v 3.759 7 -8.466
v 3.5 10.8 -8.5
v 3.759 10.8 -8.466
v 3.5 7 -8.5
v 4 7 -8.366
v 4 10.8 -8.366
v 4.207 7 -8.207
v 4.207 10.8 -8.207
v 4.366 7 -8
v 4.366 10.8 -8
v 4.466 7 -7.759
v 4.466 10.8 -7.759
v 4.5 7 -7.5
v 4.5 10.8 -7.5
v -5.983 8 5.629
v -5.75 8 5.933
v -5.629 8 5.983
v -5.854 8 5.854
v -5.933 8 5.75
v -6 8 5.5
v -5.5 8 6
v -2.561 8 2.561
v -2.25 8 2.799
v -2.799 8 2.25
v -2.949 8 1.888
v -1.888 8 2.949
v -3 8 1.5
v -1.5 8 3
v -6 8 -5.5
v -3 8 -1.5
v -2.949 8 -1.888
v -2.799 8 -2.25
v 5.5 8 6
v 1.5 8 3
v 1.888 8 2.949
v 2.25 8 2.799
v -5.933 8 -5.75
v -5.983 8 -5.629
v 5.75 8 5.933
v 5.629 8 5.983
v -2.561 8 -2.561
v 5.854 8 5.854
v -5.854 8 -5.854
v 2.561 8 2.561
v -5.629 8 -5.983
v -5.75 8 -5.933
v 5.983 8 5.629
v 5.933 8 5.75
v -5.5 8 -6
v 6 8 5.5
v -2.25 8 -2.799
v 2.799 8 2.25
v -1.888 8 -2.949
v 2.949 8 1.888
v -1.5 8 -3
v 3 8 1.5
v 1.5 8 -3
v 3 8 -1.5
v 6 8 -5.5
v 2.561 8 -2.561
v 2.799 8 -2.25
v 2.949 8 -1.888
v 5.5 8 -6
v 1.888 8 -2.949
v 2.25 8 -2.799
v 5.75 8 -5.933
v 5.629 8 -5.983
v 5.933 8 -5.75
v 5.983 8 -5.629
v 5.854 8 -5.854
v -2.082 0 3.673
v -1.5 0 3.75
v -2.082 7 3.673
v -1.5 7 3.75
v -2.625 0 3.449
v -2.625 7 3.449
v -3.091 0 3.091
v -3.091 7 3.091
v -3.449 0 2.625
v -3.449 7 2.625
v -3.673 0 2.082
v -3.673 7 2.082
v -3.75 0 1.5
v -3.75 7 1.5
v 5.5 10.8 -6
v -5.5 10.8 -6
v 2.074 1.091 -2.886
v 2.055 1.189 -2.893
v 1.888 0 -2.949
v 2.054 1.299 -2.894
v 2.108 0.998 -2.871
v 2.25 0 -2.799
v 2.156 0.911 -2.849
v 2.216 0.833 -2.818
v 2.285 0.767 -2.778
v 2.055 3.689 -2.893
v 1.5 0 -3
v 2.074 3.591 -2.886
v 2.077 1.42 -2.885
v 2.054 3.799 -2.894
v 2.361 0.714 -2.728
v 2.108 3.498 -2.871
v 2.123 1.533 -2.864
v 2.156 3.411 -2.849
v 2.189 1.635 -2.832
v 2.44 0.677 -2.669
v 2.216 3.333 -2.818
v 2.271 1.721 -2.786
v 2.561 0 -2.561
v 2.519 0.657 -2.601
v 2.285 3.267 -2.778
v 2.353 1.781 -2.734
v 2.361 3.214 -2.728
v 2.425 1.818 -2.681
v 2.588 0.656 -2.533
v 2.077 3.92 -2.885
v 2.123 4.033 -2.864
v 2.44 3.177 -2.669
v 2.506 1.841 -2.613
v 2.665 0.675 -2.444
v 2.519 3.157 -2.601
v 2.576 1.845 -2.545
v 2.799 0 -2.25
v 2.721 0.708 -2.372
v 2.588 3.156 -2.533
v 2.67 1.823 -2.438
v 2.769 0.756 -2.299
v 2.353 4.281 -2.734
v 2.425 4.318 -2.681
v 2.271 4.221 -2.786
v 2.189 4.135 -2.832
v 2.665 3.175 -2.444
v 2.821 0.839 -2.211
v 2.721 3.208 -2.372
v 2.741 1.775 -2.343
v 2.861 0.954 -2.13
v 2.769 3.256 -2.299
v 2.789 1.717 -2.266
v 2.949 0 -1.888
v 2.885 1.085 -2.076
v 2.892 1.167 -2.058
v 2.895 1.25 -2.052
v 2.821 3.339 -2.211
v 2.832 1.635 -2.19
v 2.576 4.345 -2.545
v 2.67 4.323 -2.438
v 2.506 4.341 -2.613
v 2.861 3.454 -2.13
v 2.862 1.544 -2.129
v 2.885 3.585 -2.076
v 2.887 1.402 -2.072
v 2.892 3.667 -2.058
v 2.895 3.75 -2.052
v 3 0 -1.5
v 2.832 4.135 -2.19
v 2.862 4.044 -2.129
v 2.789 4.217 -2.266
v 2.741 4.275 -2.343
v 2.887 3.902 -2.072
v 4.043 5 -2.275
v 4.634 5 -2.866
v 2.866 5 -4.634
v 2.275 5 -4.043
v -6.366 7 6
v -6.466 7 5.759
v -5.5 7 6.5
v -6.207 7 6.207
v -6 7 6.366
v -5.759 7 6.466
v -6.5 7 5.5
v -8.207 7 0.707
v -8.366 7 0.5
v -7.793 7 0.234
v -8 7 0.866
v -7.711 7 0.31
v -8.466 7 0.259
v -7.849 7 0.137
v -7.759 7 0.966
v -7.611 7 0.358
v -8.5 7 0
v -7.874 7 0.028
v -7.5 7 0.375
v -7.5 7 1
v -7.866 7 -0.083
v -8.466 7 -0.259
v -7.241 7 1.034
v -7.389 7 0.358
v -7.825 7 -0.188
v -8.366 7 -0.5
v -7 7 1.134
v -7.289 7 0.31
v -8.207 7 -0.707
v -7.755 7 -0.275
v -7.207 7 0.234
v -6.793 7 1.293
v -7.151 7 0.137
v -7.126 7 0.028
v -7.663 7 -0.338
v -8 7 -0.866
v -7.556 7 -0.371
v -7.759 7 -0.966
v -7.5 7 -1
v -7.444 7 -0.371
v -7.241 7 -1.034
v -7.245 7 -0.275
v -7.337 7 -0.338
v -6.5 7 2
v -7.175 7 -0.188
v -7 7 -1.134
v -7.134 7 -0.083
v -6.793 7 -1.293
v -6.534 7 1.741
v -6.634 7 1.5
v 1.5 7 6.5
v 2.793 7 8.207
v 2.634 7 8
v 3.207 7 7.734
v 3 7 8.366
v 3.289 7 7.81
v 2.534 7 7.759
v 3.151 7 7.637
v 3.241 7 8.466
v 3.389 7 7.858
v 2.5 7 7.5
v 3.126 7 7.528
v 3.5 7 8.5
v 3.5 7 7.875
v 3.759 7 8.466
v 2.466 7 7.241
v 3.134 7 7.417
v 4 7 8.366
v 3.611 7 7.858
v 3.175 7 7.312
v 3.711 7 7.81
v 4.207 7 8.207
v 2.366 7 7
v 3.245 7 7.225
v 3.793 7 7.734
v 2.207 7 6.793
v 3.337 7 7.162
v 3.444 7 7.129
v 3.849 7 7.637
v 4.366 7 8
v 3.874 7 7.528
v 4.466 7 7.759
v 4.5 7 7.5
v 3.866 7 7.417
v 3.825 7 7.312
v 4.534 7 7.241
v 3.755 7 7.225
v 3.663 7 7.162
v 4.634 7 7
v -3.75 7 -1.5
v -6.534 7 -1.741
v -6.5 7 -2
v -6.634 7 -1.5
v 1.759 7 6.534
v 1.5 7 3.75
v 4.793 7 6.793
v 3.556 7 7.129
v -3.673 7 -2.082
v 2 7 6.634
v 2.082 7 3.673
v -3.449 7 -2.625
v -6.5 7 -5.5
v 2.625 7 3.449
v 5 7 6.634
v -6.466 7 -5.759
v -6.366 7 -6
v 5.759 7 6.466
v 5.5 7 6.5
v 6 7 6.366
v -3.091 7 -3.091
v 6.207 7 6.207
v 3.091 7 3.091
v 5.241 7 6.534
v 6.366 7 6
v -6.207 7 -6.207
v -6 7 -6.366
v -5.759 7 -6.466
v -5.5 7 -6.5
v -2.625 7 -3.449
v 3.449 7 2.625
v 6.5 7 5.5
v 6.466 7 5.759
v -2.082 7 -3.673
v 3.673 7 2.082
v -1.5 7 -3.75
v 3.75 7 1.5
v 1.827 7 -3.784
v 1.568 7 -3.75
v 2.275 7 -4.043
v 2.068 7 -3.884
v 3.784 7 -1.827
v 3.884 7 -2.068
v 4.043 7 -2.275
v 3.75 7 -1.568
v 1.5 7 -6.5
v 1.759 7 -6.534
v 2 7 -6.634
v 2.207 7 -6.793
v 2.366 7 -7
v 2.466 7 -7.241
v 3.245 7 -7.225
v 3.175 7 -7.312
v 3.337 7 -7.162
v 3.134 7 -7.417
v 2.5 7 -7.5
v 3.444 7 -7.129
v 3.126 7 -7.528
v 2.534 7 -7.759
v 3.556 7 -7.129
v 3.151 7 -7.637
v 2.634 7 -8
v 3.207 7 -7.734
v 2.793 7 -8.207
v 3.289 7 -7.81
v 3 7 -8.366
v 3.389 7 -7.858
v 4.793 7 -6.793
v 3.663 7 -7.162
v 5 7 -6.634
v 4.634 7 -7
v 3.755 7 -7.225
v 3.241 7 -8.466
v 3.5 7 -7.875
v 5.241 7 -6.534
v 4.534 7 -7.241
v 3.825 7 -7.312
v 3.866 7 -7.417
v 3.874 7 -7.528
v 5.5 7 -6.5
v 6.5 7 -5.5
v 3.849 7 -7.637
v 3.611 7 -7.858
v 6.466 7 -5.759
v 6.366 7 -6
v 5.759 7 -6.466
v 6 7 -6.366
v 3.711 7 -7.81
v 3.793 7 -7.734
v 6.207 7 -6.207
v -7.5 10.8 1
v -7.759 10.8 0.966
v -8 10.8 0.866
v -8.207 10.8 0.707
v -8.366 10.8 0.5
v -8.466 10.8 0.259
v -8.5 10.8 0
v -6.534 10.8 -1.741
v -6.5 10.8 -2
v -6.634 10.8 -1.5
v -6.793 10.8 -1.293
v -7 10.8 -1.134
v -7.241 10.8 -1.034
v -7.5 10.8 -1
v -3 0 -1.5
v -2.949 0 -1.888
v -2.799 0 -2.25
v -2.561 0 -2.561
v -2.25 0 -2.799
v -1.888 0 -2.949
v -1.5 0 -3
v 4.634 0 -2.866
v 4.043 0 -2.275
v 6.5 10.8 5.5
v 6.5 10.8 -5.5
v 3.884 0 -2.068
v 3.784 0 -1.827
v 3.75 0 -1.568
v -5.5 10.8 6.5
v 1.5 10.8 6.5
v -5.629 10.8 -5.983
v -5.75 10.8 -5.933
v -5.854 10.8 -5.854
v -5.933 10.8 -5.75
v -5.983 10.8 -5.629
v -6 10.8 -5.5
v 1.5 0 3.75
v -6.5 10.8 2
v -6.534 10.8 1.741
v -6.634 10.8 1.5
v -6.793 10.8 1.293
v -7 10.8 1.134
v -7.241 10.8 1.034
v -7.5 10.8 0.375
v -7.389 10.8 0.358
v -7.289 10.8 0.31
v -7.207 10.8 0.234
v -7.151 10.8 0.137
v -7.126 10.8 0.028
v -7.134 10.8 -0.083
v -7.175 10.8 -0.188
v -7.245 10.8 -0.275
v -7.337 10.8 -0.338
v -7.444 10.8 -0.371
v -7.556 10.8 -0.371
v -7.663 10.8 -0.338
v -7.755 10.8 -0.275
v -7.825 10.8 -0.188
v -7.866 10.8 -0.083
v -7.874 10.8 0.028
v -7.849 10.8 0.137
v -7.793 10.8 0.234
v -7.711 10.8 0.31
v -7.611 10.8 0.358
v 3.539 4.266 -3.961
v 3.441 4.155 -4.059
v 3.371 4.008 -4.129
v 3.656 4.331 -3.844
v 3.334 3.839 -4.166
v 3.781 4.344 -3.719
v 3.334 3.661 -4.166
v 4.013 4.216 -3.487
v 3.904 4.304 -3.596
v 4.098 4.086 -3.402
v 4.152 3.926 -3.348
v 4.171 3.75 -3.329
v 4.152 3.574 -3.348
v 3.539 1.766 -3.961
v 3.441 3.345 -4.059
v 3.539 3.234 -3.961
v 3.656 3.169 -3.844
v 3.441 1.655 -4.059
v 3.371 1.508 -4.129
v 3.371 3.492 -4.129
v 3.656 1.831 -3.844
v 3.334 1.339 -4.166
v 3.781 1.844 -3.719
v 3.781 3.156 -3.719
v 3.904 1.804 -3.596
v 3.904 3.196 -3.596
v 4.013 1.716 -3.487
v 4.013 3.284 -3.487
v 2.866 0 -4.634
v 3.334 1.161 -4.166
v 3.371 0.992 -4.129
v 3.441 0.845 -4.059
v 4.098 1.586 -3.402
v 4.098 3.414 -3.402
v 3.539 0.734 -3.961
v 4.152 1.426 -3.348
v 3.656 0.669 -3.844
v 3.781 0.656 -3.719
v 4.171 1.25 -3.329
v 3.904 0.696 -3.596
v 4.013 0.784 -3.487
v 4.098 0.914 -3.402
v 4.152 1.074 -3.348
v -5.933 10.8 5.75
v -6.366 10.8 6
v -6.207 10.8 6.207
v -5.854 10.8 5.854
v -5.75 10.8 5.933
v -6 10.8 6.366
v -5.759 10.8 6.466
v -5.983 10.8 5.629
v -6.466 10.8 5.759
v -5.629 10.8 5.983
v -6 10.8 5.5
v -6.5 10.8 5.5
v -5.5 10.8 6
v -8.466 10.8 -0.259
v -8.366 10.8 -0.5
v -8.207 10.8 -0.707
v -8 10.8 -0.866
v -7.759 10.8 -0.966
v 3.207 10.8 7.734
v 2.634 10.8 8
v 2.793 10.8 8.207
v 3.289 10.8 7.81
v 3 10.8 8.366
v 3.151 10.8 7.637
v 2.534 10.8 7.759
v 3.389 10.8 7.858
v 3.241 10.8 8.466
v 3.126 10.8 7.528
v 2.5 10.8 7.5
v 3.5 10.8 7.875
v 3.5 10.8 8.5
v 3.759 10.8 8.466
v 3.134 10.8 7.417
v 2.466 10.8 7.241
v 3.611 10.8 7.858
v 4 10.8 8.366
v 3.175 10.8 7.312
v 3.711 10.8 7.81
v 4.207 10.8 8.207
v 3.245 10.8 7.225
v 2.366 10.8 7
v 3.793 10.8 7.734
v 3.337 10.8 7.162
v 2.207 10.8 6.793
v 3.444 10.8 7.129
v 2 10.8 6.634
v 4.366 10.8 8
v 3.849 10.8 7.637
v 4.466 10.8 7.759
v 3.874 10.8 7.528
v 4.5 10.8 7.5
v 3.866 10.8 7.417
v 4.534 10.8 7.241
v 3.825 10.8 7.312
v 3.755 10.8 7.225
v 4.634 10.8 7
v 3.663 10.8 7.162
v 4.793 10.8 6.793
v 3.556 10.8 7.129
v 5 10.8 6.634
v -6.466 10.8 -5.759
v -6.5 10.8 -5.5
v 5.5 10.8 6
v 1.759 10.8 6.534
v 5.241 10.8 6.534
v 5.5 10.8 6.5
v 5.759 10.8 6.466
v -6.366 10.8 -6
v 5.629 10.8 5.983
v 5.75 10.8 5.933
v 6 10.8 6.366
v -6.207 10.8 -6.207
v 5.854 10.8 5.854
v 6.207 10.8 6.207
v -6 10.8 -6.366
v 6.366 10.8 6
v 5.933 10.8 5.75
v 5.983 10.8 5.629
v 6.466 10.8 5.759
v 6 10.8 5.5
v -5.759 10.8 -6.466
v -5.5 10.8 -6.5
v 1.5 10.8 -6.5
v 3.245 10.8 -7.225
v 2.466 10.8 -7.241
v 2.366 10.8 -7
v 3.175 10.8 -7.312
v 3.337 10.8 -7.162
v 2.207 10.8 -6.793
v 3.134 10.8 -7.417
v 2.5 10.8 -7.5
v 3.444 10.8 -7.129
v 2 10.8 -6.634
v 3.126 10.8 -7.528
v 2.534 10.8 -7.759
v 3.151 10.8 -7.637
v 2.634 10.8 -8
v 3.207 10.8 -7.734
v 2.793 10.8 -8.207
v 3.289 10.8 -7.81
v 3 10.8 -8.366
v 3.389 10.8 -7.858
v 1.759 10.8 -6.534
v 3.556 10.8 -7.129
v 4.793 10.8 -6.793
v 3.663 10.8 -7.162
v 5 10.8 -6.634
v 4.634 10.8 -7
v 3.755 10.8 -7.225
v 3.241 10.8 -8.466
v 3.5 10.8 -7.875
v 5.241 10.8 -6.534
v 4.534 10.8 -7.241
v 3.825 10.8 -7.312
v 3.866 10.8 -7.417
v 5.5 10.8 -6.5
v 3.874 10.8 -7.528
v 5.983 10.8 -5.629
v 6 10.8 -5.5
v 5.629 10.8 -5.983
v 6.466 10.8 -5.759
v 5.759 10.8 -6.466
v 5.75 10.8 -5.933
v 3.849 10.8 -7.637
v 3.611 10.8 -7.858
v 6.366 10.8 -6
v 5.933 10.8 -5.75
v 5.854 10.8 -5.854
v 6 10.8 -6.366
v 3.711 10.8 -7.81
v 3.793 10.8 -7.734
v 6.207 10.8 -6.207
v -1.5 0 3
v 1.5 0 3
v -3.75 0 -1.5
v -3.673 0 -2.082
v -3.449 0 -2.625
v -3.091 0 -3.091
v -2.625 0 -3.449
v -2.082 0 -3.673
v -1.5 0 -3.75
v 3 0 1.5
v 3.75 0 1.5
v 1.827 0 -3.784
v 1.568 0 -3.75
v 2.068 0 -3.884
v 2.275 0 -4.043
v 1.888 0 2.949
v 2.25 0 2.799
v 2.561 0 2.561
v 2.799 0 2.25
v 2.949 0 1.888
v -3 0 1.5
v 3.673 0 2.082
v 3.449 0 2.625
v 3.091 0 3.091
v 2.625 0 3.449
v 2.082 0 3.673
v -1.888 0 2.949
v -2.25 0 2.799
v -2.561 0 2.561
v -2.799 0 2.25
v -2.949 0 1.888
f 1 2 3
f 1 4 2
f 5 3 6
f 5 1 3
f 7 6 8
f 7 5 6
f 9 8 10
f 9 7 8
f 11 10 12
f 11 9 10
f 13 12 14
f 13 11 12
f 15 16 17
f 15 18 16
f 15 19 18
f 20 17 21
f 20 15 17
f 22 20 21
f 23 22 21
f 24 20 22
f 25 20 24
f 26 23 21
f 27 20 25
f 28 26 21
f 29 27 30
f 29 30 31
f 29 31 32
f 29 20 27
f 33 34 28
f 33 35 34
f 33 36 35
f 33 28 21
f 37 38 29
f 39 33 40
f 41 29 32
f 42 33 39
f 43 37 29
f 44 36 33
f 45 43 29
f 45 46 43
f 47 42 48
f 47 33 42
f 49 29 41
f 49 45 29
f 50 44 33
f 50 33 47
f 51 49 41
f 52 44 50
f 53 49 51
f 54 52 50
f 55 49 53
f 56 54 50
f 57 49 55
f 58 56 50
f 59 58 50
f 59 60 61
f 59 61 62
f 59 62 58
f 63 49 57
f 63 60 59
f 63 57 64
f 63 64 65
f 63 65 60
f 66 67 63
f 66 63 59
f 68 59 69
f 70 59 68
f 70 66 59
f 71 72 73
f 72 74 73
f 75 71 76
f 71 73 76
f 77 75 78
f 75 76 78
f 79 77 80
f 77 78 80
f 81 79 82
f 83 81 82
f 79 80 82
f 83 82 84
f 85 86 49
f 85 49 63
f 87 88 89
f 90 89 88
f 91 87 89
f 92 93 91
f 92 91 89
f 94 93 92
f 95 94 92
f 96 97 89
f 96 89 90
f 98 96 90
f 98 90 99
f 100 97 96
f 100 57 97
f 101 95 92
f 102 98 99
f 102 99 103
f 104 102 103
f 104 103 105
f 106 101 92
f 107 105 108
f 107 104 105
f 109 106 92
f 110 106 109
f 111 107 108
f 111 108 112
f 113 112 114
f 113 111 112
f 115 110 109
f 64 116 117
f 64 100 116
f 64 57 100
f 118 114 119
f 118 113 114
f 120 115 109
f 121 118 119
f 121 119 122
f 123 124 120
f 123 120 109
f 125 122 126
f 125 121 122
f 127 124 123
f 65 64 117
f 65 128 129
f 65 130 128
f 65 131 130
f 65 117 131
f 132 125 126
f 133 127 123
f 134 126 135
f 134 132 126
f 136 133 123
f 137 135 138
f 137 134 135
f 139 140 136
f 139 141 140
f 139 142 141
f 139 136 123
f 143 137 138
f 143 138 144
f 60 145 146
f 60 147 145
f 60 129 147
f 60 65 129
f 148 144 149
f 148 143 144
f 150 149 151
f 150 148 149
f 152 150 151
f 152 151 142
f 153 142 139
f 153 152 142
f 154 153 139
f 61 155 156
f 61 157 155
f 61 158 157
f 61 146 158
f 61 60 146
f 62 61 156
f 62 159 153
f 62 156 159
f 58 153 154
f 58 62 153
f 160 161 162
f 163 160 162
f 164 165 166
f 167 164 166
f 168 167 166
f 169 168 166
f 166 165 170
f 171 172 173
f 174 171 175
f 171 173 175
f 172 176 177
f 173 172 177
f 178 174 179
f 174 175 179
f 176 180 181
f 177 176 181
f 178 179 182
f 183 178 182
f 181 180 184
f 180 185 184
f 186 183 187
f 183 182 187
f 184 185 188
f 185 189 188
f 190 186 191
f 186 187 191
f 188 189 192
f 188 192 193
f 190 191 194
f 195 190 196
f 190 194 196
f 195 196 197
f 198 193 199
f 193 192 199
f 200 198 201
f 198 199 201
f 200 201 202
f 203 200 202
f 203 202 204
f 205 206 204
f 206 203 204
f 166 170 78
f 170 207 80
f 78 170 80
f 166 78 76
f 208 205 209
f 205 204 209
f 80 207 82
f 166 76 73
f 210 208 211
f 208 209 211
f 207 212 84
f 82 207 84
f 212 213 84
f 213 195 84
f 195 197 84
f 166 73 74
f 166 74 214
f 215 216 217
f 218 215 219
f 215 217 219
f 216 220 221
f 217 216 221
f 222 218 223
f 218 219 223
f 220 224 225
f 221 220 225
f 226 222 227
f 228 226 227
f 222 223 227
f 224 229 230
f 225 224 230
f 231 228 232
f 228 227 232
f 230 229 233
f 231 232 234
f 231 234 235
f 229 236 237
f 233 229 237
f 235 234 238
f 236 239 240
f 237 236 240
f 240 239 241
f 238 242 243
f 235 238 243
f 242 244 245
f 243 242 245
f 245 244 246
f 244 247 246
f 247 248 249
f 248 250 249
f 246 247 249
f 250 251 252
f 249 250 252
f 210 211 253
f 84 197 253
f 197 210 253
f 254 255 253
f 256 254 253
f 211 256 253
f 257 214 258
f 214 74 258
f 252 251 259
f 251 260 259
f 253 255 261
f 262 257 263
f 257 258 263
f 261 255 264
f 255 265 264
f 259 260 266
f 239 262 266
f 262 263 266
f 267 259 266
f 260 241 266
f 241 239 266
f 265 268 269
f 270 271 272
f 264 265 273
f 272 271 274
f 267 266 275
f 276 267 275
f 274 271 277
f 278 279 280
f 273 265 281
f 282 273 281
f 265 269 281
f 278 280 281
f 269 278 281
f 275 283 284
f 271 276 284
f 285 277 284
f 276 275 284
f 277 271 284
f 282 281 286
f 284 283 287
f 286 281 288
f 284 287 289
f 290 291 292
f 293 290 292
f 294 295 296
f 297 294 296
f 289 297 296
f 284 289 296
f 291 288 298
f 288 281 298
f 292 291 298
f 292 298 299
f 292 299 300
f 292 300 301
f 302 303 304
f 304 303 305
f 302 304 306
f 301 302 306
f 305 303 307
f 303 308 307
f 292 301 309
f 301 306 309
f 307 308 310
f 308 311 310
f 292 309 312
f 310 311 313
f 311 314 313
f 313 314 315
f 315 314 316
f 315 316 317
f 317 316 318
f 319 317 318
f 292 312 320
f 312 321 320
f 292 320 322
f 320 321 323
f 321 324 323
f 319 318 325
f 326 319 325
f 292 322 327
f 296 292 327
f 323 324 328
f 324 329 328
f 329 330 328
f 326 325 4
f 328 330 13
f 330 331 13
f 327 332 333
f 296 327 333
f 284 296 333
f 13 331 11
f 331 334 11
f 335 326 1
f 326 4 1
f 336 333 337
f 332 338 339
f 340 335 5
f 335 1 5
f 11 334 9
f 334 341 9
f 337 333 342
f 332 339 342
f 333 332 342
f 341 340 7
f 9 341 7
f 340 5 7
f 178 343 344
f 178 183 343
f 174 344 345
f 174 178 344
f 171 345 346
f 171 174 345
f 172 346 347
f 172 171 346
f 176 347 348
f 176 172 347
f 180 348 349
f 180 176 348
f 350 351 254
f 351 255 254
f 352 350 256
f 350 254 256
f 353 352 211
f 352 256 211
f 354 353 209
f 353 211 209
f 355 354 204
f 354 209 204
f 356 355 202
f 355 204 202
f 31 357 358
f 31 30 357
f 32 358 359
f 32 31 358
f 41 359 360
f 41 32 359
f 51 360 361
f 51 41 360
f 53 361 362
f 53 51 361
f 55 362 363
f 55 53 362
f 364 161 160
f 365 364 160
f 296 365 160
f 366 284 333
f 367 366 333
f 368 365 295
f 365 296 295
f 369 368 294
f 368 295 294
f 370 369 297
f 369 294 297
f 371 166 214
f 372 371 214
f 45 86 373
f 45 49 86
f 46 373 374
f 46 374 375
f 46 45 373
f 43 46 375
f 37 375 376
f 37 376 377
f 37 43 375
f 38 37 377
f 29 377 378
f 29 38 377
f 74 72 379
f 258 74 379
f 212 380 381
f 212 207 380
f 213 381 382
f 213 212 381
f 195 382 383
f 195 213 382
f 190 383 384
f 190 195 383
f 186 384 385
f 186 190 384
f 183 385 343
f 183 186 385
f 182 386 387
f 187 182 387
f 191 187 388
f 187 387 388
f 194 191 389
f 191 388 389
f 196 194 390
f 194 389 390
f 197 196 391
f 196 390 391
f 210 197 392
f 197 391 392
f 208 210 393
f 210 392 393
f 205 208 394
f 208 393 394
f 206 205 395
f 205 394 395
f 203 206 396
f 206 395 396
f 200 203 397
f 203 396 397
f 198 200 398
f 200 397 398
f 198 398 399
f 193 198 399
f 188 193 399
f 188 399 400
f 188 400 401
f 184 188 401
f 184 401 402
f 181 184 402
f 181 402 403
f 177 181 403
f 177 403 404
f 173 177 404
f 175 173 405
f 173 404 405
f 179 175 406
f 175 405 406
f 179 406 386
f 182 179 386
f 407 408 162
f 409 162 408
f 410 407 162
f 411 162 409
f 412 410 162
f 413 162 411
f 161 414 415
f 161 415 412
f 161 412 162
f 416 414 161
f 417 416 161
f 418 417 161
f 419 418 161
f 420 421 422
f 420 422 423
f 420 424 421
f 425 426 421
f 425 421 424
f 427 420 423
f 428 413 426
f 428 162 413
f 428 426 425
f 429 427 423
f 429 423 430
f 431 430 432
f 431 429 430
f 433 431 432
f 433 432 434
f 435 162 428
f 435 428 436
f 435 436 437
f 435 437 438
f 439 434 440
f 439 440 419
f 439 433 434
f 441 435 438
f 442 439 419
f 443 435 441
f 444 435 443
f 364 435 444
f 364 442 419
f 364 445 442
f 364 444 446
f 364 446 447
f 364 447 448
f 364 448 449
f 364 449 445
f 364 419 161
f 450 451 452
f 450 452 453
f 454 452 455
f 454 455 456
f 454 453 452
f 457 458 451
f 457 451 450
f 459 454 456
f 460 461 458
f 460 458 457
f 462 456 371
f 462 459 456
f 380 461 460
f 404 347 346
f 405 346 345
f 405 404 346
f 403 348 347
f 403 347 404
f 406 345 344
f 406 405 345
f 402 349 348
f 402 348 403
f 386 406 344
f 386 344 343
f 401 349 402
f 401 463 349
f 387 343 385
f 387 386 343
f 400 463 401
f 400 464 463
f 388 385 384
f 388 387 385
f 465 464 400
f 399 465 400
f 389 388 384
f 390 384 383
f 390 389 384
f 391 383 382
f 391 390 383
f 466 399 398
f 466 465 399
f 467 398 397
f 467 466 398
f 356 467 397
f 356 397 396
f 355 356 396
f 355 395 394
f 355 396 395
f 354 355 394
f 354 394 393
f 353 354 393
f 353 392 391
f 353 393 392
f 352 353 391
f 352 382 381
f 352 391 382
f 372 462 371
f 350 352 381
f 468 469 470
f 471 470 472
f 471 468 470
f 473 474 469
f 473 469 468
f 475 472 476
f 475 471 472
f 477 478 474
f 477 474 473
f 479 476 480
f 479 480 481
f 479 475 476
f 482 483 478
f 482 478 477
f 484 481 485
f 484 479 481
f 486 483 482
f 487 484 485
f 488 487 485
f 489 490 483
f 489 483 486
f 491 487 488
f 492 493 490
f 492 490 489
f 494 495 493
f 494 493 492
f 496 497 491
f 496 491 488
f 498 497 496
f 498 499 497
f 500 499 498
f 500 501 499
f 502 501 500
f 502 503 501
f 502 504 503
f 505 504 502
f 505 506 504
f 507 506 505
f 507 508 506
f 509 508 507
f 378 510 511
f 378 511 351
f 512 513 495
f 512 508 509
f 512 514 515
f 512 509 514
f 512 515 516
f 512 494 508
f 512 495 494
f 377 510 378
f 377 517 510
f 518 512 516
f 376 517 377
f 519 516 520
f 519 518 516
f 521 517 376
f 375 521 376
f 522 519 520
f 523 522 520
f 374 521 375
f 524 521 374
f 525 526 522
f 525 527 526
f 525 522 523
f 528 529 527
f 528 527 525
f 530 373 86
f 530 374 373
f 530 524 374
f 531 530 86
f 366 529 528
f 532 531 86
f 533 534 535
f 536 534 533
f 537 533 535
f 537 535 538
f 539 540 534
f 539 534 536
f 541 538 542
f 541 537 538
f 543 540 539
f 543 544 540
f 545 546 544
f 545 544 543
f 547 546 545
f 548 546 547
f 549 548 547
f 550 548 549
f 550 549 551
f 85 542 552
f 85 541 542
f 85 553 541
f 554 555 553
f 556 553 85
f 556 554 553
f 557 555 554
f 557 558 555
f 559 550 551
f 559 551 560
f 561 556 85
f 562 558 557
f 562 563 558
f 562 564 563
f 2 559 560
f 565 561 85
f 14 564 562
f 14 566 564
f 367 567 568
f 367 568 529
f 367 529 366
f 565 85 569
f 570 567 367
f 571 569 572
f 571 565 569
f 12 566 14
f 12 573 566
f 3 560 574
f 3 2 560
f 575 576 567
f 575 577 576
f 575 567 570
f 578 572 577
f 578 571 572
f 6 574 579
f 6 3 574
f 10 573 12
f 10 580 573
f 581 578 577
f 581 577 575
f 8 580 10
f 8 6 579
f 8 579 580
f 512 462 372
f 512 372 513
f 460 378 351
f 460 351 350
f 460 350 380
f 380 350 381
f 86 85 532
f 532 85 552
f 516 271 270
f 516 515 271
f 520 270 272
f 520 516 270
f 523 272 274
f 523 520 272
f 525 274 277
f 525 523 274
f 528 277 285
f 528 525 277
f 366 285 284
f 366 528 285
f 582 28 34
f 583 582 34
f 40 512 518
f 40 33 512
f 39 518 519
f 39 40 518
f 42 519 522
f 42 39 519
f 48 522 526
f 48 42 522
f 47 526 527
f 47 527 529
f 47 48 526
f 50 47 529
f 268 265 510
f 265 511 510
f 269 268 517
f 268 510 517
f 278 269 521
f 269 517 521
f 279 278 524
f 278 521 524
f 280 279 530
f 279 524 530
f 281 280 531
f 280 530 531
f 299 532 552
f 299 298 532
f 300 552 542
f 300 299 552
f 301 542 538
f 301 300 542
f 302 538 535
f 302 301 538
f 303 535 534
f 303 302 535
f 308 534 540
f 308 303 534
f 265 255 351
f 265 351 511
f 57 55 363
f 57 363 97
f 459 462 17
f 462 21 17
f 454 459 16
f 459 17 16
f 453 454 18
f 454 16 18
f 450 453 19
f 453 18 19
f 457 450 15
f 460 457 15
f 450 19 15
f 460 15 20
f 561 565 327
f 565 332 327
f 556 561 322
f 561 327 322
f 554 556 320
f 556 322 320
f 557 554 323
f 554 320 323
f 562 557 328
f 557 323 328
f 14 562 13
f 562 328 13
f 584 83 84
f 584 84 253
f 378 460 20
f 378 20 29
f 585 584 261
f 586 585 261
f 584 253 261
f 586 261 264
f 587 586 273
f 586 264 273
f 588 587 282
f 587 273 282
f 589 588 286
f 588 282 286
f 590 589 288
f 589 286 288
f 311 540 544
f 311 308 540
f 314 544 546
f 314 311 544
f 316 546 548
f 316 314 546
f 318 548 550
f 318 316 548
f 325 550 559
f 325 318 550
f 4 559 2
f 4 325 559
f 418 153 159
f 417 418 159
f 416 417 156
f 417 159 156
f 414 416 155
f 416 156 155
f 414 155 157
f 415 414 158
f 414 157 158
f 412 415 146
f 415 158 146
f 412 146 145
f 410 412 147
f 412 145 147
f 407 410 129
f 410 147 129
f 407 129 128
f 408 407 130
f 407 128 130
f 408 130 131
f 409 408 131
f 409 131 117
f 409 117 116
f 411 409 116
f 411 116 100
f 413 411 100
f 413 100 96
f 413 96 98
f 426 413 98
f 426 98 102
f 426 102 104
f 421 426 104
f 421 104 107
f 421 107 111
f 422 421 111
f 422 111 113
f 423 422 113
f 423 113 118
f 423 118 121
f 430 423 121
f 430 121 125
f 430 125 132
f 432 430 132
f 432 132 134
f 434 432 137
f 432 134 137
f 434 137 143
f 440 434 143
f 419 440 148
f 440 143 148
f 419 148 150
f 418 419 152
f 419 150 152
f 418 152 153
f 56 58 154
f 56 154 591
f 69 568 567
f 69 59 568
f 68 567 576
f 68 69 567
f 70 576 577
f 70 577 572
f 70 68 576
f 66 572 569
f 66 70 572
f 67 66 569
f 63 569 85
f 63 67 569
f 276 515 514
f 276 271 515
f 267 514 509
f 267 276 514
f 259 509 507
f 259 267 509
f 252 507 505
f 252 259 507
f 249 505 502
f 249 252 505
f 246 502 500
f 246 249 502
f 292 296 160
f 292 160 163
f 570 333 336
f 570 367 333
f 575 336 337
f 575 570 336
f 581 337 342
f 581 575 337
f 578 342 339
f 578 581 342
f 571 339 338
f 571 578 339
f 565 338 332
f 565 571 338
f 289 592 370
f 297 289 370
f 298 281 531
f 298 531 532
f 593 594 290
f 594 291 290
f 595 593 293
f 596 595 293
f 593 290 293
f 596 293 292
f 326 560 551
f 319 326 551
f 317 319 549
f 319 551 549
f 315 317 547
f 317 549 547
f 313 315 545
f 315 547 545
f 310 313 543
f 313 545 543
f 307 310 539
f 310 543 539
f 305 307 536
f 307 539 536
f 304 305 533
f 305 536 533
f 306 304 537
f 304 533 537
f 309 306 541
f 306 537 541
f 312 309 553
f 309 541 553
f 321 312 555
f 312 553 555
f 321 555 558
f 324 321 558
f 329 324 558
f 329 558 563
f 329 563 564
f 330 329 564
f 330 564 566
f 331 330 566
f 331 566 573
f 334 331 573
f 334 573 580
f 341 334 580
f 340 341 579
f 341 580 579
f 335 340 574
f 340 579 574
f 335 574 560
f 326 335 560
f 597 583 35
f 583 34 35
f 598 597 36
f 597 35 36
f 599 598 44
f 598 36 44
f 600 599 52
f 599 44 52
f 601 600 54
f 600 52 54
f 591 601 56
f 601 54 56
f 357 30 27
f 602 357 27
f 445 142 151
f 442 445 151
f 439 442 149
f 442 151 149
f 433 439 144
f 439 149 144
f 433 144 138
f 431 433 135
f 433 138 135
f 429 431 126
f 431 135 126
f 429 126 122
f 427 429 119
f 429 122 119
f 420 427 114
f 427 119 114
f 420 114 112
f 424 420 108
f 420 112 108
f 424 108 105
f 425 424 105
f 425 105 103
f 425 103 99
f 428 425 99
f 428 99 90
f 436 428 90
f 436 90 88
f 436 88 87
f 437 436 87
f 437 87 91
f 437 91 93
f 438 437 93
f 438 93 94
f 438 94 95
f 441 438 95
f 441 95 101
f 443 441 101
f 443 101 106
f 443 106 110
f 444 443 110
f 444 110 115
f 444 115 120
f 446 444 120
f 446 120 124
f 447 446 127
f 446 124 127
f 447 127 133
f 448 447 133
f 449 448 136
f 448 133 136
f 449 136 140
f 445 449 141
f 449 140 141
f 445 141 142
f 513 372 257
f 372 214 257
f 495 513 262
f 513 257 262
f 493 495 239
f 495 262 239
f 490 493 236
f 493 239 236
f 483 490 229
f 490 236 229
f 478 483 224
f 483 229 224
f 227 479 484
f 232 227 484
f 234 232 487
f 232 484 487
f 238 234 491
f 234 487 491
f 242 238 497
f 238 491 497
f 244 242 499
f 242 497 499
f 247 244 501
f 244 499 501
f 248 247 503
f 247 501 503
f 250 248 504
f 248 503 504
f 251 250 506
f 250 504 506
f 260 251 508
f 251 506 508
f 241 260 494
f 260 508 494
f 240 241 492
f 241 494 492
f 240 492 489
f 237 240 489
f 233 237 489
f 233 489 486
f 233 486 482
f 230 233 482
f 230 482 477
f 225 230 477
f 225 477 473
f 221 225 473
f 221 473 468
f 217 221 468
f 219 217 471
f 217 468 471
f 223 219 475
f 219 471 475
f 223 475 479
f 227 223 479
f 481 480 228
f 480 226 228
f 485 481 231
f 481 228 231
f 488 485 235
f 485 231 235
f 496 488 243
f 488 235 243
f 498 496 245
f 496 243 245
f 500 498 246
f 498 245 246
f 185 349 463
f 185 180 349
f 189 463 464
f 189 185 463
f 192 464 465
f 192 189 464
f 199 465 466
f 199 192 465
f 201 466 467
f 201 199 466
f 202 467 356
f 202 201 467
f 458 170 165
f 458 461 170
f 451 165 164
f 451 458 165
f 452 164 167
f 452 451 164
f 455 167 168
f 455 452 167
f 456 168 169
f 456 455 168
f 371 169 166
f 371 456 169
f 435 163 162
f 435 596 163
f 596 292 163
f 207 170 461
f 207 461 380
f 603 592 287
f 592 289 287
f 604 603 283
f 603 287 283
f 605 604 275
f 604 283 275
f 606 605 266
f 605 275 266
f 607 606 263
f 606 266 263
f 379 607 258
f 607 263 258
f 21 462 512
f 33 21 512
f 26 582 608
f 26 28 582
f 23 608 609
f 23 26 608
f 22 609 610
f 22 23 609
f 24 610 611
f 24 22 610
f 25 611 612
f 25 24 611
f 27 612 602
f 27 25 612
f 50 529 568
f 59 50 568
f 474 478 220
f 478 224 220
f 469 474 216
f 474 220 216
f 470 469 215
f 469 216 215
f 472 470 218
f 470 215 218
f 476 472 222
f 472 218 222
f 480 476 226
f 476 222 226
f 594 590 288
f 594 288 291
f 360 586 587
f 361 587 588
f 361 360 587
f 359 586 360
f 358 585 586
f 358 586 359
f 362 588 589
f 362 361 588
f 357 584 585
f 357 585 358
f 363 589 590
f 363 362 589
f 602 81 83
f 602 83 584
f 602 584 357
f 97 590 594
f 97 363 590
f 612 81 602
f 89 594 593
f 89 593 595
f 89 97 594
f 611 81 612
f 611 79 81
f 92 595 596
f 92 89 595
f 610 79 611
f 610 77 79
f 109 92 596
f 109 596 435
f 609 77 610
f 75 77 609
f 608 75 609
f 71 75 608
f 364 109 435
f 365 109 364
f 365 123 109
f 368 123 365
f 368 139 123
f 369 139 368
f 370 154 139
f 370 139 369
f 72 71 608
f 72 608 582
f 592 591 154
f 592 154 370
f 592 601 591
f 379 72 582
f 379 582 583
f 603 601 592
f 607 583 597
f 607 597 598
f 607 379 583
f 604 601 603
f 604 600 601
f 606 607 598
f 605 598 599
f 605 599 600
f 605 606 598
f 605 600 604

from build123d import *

# Parameters (mm, degrees)
SKETCH1_W                     = 7.5
SKETCH1_H                     = 7.5
BOSS_EXTRUDE1_DEPTH           = 7
SKETCH2_W                     = 13
SKETCH2_H                     = 13
BOSS_EXTRUDE2_DEPTH           = 3.8
SKETCH3_W                     = 6
SKETCH3_H                     = 6
CUT_EXTRUDE1_DEPTH            = 15.182383439
SKETCH6_W                     = 12
SKETCH6_H                     = 12
CUT_EXTRUDE3_DEPTH            = 2.8
FILLET1_R                     = 0.5
BOSS_EXTRUDE3_REACH           = 16.182
FILLET4_R                     = 1.5
FILLET2_R                     = 1
TAP_DRILL_FOR_0_80_TAP1_D     = 1.19126
TAP_DRILL_FOR_0_80_TAP1_DEPTH = 7.11
TAP_DRILL_FOR_0_80_TAP1_TIP   = 0.357890611
FILLET5_R                     = 2.25
SKETCH16_W                    = 2.5
SKETCH16_H                    = 2
CUT_EXTRUDE4_DEPTH            = 0.835786
FILLET6_R                     = 1
SKETCH17_W                    = 2
SKETCH17_H                    = 2
SKETCH17_R                    = 0.375
BOSS_EXTRUDE4_DEPTH           = 3.8
FILLET7_R                     = 1


with BuildPart() as part:
    # Sketch1 → Boss-Extrude1 (new body)
    with BuildSketch(Plane(origin=(0, 0, 0), x_dir=(1, 0, 0), z_dir=(0, 1, 0))):
        Rectangle(SKETCH1_W, SKETCH1_H)
    extrude(amount=BOSS_EXTRUDE1_DEPTH)

    # Sketch2 → Boss-Extrude2 (add)
    with BuildSketch(Plane(origin=(0, 7, 0), x_dir=(1, 0, 0), z_dir=(0, 1, 0))):
        Rectangle(SKETCH2_W, SKETCH2_H)
    extrude(amount=BOSS_EXTRUDE2_DEPTH)

    # Sketch3 → Cut-Extrude1 (cut, through all)
    with BuildSketch(Plane.XZ):
        Rectangle(SKETCH3_W, SKETCH3_H)
    extrude(amount=-CUT_EXTRUDE1_DEPTH, mode=Mode.SUBTRACT)

    # Sketch6 → Cut-Extrude3 (cut)
    with BuildSketch(Plane(origin=(0, 10.8, 0), x_dir=(1, 0, 0), z_dir=(0, 1, 0))):
        Rectangle(SKETCH6_W, SKETCH6_H)
    extrude(amount=-CUT_EXTRUDE3_DEPTH, mode=Mode.SUBTRACT)

    # Fillet1
    fillet1_edges = [part.edges().sort_by_distance(p)[0] for p in [
        (6, 9.4, 6),
        (6, 9.4, -6),
        (-6, 9.4, -6),
        (-6, 9.4, 6),
    ]]
    fillet(fillet1_edges, radius=FILLET1_R)

    # Sketch12 → Boss-Extrude3 (add, up to next)
    with BuildSketch(Plane.XZ, mode=Mode.PRIVATE) as boss_extrude3_sk1:
        Polygon((3.75, -3.75), (4.633883476, -2.866116524), (3.75, -1.982233047), align=None)
    boss_extrude3_tool1 = extrude(boss_extrude3_sk1.sketch, amount=-BOSS_EXTRUDE3_REACH, mode=Mode.PRIVATE) - part.part
    # Sketch12 → Boss-Extrude3 (add, up to next)
    with BuildSketch(Plane.XZ, mode=Mode.PRIVATE) as boss_extrude3_sk2:
        Polygon((2.866116524, -4.633883476), (3.75, -3.75), (1.982233047, -3.75), align=None)
    boss_extrude3_tool2 = extrude(boss_extrude3_sk2.sketch, amount=-BOSS_EXTRUDE3_REACH, mode=Mode.PRIVATE) - part.part
    add(boss_extrude3_tool1.solids().sort_by_distance((4.044628, 0, -2.866117))[0])
    add(boss_extrude3_tool2.solids().sort_by_distance((2.866117, 0, -4.044628))[0])

    # Fillet4
    fillet4_edges = [part.edges().sort_by_distance(p)[0] for p in [
        (-3, 4, 3),
        (3, 4, 3),
        (-3, 4, -3),
        (3, 4, -3),
    ]]
    fillet(fillet4_edges, radius=FILLET4_R)

    # Fillet2
    fillet2_edges = [part.edges().sort_by_distance(p)[0] for p in [
        (3.75, 3.5, -1.982233047),
        (1.982233047, 3.5, -3.75),
    ]]
    fillet(fillet2_edges, radius=FILLET2_R)

    # Tap Drill for #0-80 Tap1
    with Locations(Plane(origin=(3.75, 0, -3.75), x_dir=(-0.7071067811865475, 0, -0.7071067811865477), z_dir=(0.7071067811865477, 0, -0.7071067811865475))):
        with Locations((0, 1.25), (0, 3.75)):
            Hole(TAP_DRILL_FOR_0_80_TAP1_D / 2, depth=TAP_DRILL_FOR_0_80_TAP1_DEPTH)
            with Locations((0, 0, -(TAP_DRILL_FOR_0_80_TAP1_DEPTH + TAP_DRILL_FOR_0_80_TAP1_TIP / 2))):  # 118° drill point
                Cone(0, TAP_DRILL_FOR_0_80_TAP1_D / 2, TAP_DRILL_FOR_0_80_TAP1_TIP, mode=Mode.SUBTRACT)

    # Fillet5
    fillet5_edges = [part.edges().sort_by_distance(p)[0] for p in [
        (3.75, 3.5, 3.75),
        (-3.75, 3.5, 3.75),
        (-3.75, 3.5, -3.75),
    ]]
    fillet(fillet5_edges, radius=FILLET5_R)

    # Sketch16 → Cut-Extrude4 (cut)
    with BuildSketch(Plane(origin=(3.75, 0, -3.75), x_dir=(-0.7071067811865474, 0, -0.7071067811865477), z_dir=(0.7071067811865477, 0, -0.7071067811865474))):
        with Locations((0, 6)):
            Rectangle(SKETCH16_W, SKETCH16_H)
    extrude(amount=-CUT_EXTRUDE4_DEPTH, mode=Mode.SUBTRACT)

    # Fillet6
    fillet6_edges = [part.edges().sort_by_distance(p)[0] for p in [
        (-6.5, 8.9, -6.5),
        (-6.5, 8.9, 6.5),
        (6.5, 8.9, 6.5),
        (6.5, 8.9, -6.5),
    ]]
    fillet(fillet6_edges, radius=FILLET6_R)

    # Sketch17 → Boss-Extrude4 (add)
    # profile 1 of 3: a face of its own
    with BuildSketch(Plane(origin=(0, 10.8, 0), x_dir=(1, 0, 0), z_dir=(0, 1, 0))):
        with Locations((-7.5, 0)):
            Rectangle(SKETCH17_W, SKETCH17_H)
        with Locations(Location((-7.5, 0, 0), (0, 0, 270))):
            Circle(SKETCH17_R, mode=Mode.SUBTRACT)
    # profile 2 of 3: a face of its own
    with BuildSketch(Plane(origin=(0, 10.8, 0), x_dir=(1, 0, 0), z_dir=(0, 1, 0))):
        with Locations((3.5, -7.5)):
            Rectangle(SKETCH17_W, SKETCH17_H)
        with Locations(Location((3.5, -7.5, 0), (0, 0, 270))):
            Circle(SKETCH17_R, mode=Mode.SUBTRACT)
    # profile 3 of 3: a face of its own
    with BuildSketch(Plane(origin=(0, 10.8, 0), x_dir=(1, 0, 0), z_dir=(0, 1, 0))):
        with Locations((3.5, 7.5)):
            Rectangle(SKETCH17_W, SKETCH17_H)
        with Locations(Location((3.5, 7.5, 0), (0, 0, 90))):
            Circle(SKETCH17_R, mode=Mode.SUBTRACT)
    extrude(amount=-BOSS_EXTRUDE4_DEPTH)

    # Fillet7
    fillet7_edges = [part.edges().sort_by_distance(p)[0] for p in [
        (-6.5, 8.9, 1),
        (-8.5, 8.9, 1),
        (-8.5, 8.9, -1),
        (-6.5, 8.9, -1),
        (2.5, 8.9, -6.5),
        (2.5, 8.9, -8.5),
        (4.5, 8.9, -8.5),
        (4.5, 8.9, -6.5),
        (2.5, 8.9, 6.5),
        (2.5, 8.9, 8.5),
        (4.5, 8.9, 8.5),
        (4.5, 8.9, 6.5),
    ]]
    fillet(fillet7_edges, radius=FILLET7_R - 0.0001)  # a hair under: the kernel refuses the full size


solid = part.part
